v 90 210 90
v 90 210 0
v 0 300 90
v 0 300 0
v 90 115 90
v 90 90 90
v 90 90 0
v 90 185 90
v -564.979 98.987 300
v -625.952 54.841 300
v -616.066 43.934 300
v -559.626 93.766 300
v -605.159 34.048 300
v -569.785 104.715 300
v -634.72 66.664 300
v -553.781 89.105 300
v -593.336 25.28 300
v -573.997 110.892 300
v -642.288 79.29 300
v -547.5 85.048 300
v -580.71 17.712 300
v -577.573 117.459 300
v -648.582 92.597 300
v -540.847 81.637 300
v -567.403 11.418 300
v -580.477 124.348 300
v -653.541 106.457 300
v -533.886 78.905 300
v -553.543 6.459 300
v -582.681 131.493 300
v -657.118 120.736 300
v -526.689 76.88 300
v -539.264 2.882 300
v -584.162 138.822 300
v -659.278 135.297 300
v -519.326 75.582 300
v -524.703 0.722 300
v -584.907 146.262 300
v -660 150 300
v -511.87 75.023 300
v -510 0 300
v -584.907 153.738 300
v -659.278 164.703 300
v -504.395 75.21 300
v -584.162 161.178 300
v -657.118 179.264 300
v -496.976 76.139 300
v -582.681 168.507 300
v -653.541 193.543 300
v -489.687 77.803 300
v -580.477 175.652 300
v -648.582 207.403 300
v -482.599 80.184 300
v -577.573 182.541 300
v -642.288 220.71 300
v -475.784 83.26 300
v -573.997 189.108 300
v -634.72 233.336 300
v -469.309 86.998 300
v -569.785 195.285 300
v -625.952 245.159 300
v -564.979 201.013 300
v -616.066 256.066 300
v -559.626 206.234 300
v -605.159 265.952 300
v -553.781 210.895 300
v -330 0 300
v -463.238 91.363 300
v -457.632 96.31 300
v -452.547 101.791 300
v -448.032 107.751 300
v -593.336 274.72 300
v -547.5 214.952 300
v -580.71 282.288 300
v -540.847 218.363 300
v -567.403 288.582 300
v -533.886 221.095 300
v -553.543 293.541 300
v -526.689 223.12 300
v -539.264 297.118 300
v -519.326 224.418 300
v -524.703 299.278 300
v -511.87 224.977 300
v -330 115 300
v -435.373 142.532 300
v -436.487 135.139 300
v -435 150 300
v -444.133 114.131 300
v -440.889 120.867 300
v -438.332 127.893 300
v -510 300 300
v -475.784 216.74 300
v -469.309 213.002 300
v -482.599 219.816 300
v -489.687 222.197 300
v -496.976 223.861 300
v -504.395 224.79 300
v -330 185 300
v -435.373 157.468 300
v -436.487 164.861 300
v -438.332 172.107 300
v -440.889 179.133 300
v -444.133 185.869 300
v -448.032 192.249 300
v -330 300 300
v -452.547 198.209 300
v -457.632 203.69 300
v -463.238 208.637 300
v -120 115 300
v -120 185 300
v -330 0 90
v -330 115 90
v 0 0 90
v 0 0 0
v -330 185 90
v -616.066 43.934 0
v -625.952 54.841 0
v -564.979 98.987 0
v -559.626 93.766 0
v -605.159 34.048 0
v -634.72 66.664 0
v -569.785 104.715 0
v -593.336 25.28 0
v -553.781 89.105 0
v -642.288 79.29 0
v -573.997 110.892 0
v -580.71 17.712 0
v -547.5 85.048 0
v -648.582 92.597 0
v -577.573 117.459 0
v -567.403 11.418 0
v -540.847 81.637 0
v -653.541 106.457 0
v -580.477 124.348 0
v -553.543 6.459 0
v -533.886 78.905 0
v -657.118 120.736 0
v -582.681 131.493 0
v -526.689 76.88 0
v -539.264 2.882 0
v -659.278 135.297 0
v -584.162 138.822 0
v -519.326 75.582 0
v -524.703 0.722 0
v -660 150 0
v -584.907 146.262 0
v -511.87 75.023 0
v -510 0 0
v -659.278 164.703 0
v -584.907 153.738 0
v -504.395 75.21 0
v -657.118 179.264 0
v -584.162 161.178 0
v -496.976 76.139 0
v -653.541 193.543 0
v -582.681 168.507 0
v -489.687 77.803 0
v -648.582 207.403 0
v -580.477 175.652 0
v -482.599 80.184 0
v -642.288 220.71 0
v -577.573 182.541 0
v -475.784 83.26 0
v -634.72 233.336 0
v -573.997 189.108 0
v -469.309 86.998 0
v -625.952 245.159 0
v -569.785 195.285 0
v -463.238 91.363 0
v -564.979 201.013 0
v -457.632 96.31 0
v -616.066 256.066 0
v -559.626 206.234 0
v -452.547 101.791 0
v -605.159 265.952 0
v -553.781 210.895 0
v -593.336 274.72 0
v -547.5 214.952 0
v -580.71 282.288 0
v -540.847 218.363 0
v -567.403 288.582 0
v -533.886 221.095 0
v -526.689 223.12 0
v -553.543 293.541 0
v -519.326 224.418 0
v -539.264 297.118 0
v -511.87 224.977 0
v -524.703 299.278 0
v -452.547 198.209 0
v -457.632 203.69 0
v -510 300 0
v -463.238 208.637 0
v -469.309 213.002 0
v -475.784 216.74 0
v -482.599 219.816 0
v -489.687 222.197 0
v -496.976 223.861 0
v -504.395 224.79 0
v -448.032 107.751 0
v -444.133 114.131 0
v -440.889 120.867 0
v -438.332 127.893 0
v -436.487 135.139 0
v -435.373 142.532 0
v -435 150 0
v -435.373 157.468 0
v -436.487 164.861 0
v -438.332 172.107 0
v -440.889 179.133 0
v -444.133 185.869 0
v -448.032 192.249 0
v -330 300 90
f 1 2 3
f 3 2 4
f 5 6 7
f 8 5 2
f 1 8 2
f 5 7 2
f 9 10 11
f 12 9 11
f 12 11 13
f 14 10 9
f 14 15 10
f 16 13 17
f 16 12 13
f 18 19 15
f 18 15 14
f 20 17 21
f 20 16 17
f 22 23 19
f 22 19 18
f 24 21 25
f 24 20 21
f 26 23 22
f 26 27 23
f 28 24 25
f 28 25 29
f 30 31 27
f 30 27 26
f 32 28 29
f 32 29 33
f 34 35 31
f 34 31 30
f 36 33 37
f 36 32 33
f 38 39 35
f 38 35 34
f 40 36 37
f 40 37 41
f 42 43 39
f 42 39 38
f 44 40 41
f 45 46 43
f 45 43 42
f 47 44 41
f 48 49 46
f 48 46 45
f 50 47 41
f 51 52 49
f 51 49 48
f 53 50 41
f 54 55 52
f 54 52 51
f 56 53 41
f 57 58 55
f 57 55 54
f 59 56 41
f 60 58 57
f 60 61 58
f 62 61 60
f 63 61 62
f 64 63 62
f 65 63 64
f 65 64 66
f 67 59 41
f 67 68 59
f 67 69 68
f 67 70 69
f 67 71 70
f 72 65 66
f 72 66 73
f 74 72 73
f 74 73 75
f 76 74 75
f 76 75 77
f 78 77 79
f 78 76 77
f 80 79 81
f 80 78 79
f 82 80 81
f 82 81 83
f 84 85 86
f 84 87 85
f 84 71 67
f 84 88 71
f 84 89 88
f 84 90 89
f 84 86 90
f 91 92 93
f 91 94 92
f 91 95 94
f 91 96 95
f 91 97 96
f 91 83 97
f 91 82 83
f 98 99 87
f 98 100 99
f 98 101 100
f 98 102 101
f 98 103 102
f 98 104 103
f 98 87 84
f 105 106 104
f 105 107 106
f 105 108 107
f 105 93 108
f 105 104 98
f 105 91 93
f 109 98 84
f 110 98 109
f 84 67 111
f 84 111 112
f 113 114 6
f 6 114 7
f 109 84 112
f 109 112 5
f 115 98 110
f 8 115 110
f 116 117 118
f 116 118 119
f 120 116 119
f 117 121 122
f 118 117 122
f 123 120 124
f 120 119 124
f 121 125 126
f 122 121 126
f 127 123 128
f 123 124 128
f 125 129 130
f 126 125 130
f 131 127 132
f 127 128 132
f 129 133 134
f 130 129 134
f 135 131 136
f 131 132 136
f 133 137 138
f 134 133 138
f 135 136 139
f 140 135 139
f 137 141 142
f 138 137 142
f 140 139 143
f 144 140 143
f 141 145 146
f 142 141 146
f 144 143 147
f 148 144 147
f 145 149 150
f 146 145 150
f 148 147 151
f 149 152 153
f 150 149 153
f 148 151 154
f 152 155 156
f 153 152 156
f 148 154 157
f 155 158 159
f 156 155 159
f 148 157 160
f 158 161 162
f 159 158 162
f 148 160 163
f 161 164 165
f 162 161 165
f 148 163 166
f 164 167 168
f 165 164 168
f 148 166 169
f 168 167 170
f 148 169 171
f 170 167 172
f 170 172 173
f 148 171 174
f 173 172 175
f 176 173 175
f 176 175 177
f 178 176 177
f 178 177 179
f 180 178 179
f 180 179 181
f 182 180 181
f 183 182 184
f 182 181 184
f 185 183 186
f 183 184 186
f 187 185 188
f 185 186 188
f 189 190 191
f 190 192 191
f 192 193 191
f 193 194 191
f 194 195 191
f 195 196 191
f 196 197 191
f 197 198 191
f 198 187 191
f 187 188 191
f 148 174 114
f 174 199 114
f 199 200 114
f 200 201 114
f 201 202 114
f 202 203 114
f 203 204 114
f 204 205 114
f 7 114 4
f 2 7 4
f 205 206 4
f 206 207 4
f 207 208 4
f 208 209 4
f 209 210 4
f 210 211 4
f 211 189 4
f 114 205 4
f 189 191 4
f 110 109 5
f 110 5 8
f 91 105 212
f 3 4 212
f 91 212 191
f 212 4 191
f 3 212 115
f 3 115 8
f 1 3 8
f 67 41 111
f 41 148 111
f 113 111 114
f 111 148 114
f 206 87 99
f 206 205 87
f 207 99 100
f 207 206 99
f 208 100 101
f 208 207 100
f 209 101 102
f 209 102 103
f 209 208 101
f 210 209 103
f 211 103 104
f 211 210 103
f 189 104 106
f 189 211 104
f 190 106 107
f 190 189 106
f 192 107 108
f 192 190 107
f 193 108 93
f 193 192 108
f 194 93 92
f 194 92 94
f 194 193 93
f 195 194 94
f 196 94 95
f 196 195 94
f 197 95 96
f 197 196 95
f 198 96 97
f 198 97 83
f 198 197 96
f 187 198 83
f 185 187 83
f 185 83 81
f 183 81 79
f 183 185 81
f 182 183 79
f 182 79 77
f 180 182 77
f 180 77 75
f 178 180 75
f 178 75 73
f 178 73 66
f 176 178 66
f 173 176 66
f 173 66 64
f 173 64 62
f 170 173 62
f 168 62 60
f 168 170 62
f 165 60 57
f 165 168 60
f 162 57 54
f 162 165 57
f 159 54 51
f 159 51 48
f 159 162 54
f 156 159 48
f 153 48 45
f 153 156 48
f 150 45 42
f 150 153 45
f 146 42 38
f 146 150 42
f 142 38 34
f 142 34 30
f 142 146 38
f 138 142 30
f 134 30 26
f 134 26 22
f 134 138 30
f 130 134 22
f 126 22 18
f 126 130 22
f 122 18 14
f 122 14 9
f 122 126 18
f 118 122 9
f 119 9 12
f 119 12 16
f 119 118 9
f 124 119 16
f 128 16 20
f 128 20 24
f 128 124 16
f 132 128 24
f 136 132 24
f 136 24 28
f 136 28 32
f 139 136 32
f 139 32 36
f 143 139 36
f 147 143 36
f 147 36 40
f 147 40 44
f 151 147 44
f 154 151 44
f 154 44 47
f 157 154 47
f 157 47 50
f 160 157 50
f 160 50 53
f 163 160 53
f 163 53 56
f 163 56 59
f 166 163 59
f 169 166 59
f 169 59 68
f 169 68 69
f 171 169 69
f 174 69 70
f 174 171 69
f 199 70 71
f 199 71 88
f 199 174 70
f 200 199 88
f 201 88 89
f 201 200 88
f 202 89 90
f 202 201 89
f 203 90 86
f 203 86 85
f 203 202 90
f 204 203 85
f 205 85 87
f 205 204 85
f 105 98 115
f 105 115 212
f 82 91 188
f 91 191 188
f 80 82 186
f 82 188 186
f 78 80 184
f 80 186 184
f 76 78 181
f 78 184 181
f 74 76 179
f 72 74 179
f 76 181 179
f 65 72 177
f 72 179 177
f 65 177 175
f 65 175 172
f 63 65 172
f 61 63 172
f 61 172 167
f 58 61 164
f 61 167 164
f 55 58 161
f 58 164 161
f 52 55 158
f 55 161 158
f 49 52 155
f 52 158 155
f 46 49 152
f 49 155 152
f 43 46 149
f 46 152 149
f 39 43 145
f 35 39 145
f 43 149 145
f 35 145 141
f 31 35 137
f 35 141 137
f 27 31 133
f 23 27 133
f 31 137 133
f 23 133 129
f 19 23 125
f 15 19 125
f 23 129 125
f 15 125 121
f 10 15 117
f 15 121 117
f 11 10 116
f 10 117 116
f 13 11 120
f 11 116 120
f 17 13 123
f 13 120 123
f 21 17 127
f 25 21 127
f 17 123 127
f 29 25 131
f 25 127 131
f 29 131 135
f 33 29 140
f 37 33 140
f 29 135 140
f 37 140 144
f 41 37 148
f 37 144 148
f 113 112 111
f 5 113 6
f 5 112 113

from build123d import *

# Parameters (mm, degrees)
F0_R     = 75
F1_DEPTH = 90
F2_R     = 75
F2_W     = 420
F2_H     = 70
F3_DEPTH = 210
F4_SIZE  = 210


with BuildPart() as f1:
    # F0 (on Top) → F1 (new body)
    with BuildSketch(Plane.XY):
        with BuildLine():
            Line((-510, 0), (0, 0))
            Line((0, 0), (90, 90))
            Line((90, 90), (90, 210))
            Line((90, 210), (0, 300))
            Line((0, 300), (-330, 300))
            Line((-330, 300), (-510, 300))
            ThreePointArc((-510, 300), (-660, 150), (-510, 0))
        make_face()
        with Locations((-510, 150)):
            Circle(F0_R, mode=Mode.SUBTRACT)
    extrude(amount=F1_DEPTH)

    # F2 (on face) → F3 (join)
    with BuildSketch(Plane.XY.offset(90)):
        with BuildLine():
            Line((-330, 300), (-510, 300))
            ThreePointArc((-510, 300), (-660, 150), (-510, 0))
            Line((-510, 0), (-330, 0))
            Line((-330, 0), (-330, 115))
            Line((-330, 115), (-330, 185))
            Line((-330, 185), (-330, 300))
        make_face()
        with Locations((-510, 150)):
            Circle(F2_R, mode=Mode.SUBTRACT)
        with Locations((-120, 150)):
            Rectangle(F2_W, F2_H)
    extrude(amount=F3_DEPTH)

    # F4
    f4_edges = [f1.edges().sort_by_distance(p)[0] for p in [
        (90, 150, 300),
    ]]
    chamfer(f4_edges, length=F4_SIZE)


solid = f1.part
